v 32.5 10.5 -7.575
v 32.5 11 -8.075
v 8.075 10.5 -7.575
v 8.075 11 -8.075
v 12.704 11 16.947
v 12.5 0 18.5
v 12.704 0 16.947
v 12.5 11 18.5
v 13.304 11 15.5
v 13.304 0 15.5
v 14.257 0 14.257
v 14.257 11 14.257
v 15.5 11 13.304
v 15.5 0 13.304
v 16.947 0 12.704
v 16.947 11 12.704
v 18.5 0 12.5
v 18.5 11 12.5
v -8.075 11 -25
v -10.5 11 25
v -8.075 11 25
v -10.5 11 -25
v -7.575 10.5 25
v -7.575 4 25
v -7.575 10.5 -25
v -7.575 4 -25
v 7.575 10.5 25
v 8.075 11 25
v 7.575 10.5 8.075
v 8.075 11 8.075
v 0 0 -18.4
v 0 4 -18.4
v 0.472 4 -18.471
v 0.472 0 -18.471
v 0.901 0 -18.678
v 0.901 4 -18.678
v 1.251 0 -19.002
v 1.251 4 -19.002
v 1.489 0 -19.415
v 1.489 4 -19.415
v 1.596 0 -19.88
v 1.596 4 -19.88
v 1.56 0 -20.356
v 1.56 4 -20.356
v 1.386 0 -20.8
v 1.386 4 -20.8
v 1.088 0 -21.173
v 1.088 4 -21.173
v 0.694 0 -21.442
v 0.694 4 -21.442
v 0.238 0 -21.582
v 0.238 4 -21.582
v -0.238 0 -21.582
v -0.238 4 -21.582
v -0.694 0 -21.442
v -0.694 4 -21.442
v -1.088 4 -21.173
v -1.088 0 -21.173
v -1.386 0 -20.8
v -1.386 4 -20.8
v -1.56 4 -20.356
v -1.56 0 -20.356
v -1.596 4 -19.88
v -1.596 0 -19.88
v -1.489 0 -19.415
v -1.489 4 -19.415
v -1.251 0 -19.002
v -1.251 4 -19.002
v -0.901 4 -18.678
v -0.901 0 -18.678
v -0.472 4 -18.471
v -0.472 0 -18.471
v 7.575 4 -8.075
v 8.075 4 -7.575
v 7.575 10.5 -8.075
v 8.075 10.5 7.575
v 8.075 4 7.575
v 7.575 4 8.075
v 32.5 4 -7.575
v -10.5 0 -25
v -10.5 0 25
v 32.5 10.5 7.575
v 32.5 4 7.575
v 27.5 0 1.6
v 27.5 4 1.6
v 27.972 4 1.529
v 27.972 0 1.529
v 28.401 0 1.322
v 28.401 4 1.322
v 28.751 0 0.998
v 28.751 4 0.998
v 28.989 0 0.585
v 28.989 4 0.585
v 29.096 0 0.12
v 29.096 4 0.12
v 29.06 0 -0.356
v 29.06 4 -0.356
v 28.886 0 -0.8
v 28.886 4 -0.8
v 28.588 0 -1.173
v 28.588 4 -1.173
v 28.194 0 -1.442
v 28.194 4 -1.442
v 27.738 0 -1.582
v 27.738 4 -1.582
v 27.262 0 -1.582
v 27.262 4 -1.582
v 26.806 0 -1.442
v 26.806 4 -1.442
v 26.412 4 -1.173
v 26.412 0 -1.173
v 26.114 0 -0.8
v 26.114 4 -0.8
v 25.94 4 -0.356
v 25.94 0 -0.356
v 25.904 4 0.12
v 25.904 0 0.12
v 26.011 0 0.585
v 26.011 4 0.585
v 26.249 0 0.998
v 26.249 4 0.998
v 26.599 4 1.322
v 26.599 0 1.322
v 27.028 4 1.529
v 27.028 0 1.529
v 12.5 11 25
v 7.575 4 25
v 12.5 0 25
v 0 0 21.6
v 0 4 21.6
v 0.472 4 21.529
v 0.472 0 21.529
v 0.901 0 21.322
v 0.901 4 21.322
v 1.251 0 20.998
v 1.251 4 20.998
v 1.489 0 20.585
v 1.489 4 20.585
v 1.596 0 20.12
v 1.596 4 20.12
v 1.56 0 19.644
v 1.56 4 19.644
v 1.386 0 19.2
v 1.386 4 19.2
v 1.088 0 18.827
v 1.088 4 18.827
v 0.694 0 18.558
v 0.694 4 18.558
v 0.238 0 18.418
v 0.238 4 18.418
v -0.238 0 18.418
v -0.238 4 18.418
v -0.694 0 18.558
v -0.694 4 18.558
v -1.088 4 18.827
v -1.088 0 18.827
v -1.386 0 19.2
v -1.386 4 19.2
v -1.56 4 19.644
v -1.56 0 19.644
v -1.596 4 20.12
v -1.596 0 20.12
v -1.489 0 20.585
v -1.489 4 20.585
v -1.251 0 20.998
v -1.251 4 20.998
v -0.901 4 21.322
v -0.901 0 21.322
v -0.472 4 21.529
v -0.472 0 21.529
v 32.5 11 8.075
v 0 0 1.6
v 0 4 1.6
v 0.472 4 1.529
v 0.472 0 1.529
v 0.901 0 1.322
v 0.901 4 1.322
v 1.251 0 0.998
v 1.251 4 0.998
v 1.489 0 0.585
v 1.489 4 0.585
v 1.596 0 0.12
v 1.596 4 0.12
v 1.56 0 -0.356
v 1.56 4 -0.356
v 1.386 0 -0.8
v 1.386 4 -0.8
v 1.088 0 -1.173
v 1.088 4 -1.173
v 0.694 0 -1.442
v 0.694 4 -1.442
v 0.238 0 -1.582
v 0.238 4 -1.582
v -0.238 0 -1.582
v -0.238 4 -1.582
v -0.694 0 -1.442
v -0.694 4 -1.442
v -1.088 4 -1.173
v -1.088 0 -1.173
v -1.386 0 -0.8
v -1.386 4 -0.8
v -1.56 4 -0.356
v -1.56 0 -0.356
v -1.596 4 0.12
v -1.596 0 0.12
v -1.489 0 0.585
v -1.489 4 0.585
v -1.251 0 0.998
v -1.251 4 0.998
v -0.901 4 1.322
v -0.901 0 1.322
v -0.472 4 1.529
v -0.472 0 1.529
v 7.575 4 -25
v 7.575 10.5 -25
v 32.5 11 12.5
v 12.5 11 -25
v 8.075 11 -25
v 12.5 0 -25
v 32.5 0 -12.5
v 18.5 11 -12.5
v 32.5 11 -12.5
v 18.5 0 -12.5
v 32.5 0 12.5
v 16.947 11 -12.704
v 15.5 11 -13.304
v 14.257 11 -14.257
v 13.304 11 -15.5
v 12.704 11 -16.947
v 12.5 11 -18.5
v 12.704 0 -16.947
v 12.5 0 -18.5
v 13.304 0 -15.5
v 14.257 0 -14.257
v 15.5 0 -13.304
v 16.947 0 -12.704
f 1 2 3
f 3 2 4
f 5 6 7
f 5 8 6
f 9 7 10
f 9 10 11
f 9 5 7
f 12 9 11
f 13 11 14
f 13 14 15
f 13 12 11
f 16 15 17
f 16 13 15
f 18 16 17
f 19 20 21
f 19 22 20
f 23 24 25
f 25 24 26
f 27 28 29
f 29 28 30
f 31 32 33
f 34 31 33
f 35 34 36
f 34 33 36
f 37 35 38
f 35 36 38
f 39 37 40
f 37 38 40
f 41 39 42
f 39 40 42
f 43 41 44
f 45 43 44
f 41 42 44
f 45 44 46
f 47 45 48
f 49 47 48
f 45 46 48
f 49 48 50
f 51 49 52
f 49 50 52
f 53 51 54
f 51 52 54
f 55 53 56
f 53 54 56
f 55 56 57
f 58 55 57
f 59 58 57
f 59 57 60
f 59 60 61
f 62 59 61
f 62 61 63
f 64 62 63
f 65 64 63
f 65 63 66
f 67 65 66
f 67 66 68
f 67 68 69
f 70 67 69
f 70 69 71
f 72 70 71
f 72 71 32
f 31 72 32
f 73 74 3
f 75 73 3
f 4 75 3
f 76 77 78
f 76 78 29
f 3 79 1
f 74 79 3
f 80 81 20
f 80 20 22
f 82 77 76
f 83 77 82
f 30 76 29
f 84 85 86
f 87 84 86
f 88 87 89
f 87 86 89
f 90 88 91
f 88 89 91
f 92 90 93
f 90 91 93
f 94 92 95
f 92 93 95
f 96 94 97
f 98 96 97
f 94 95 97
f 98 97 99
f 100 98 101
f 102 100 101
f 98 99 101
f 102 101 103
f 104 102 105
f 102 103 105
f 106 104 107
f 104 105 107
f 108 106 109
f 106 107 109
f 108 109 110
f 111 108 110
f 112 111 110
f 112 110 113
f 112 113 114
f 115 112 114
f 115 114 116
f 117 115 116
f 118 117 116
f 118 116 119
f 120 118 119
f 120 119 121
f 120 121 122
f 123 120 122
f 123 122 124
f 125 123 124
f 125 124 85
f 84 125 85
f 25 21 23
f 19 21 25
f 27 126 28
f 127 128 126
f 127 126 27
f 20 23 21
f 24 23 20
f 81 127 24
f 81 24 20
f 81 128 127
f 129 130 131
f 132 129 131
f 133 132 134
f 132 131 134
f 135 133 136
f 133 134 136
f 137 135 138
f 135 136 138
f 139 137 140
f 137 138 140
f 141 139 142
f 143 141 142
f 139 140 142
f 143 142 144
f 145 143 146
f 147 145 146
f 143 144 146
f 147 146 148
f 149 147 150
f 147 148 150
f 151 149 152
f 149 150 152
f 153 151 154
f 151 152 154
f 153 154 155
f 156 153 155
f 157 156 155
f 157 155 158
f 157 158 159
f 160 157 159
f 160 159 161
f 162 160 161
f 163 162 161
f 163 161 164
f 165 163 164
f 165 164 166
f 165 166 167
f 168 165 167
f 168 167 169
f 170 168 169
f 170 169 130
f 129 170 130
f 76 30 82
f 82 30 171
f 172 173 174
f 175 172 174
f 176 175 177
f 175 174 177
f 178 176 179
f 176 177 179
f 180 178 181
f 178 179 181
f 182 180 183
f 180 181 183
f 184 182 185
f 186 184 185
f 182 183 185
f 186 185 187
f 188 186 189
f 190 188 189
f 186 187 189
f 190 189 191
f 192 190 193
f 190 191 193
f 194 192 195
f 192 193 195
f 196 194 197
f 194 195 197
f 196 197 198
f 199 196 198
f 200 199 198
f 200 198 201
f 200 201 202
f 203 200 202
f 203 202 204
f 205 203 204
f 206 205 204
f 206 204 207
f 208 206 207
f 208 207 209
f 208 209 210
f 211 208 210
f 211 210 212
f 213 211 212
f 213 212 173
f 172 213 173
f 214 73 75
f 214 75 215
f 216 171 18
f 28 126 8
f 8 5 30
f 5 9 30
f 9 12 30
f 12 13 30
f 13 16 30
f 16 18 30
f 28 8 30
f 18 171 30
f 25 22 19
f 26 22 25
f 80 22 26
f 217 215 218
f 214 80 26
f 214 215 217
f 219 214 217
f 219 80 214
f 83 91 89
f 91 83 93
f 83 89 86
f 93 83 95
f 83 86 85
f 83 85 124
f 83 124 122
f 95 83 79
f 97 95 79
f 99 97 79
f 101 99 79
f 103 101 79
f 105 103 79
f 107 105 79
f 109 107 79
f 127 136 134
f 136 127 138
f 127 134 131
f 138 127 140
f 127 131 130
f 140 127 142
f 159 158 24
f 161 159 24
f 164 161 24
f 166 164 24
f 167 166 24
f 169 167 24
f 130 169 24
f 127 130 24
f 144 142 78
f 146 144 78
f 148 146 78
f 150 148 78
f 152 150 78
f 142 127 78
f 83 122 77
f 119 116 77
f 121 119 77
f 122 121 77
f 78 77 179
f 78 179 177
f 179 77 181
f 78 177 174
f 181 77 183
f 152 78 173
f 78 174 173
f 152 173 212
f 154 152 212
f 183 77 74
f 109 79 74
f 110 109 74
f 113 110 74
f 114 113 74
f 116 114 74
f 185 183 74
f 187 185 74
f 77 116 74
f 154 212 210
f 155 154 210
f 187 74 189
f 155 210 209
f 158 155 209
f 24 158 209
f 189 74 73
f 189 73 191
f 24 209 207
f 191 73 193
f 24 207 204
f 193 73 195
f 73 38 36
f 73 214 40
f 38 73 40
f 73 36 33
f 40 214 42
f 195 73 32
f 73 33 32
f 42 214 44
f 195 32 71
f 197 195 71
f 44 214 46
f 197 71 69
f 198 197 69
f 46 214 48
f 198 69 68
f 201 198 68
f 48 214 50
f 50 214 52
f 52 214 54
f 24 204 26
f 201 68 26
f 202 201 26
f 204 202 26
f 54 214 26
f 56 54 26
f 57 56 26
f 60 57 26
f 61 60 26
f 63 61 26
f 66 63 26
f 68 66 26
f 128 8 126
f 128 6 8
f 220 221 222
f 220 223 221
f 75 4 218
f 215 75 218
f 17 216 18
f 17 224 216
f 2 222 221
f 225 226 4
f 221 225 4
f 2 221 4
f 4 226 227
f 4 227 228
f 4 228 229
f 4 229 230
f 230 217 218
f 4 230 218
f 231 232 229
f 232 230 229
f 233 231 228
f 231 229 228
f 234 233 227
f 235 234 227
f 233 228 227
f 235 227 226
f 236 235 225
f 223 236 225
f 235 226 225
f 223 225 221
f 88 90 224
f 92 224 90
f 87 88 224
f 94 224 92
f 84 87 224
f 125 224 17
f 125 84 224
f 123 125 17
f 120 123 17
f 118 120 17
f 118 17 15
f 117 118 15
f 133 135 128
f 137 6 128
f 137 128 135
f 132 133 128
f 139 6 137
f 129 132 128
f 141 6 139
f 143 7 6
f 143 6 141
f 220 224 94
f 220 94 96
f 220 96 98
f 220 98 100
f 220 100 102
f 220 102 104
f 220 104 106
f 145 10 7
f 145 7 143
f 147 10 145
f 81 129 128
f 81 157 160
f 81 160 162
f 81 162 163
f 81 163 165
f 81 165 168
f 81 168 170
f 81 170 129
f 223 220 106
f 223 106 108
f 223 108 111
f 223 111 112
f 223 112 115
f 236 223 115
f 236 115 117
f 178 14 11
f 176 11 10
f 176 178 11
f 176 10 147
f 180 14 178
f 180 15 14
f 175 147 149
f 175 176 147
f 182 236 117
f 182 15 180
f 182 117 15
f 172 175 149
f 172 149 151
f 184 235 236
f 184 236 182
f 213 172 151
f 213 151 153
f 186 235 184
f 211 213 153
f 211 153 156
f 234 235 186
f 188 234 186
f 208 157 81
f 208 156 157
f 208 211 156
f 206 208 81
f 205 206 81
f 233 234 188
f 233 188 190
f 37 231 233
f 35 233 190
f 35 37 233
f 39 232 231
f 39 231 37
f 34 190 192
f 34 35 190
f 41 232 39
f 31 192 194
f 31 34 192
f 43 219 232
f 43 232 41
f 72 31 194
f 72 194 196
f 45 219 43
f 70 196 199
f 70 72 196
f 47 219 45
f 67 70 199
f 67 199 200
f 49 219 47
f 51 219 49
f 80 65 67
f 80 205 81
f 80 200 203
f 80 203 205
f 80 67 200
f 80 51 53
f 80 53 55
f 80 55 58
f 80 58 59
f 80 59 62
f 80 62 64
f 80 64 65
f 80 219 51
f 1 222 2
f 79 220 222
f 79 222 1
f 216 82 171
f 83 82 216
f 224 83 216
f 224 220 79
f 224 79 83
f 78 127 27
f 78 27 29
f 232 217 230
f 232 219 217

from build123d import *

# Parameters (mm, degrees)
EXTRUDE_1_DEPTH     = 4
SKETCH_2_W          = 2.925
SKETCH_2_H          = 50
EXTRUDE_2_DEPTH     = 7
SKETCH_3_R          = 1.6
CUT_EXTRUDE_1_DEPTH = 42.596273872
CHAMFER_1_SIZE      = 0.5
FILLET_1_R          = 6


with BuildPart() as part:
    # 草图1 → 凸台-拉伸1 (new body)
    with BuildSketch(Plane(origin=(0, 0, 0), x_dir=(1, 0, 0), z_dir=(0, 1, 0))):
        Polygon((-10.5, 25), (12.5, 25), (12.5, 12.5), (32.5, 12.5), (32.5, -12.5), (12.5, -12.5), (12.5, -25), (-10.5, -25), align=None)
    extrude(amount=EXTRUDE_1_DEPTH)

    # 草图2 → 凸台-拉伸2 (add)
    with BuildSketch(Plane(origin=(0, 4, 0), x_dir=(1, 0, 0), z_dir=(0, 1, 0))):
        Polygon((7.575, -25), (7.575, -7.575), (32.5, -7.575), (32.5, -12.5), (12.5, -12.5), (12.5, -25), align=None)
        Polygon((32.5, 7.575), (7.575, 7.575), (7.575, 25), (12.5, 25), (12.5, 12.5), (32.5, 12.5), align=None)
        with Locations((-9.0375, 0)):
            Rectangle(SKETCH_2_W, SKETCH_2_H)
    extrude(amount=EXTRUDE_2_DEPTH)

    # 草图3 → 切除-拉伸1 (cut, through all)
    with BuildSketch(Plane(origin=(0, 4, 0), x_dir=(1, 0, 0), z_dir=(0, 1, 0))):
        with Locations(Location((0, 0, 0), (0, 0, 270))):
            Circle(SKETCH_3_R)
        with Locations(Location((0, 20, 0), (0, 0, 270))):
            Circle(SKETCH_3_R)
        with Locations(Location((0, -20, 0), (0, 0, 270))):
            Circle(SKETCH_3_R)
        with Locations(Location((27.5, 0, 0), (0, 0, 270))):
            Circle(SKETCH_3_R)
    extrude(amount=-CUT_EXTRUDE_1_DEPTH, mode=Mode.SUBTRACT)

    # 倒角1
    chamfer_1_edges = [part.edges().sort_by_distance(p)[0] for p in [
        (7.575, 7.5, 7.575),
        (20.0375, 11, 7.575),
        (7.575, 11, 16.2875),
        (7.575, 7.5, -7.575),
        (7.575, 11, -16.2875),
        (20.0375, 11, -7.575),
        (-7.575, 11, 0),
    ]]
    chamfer(chamfer_1_edges, length=CHAMFER_1_SIZE)

    # 圆角1
    fillet_1_edges = [part.edges().sort_by_distance(p)[0] for p in [
        (12.5, 5.5, 12.5),
        (12.5, 5.5, -12.5),
    ]]
    fillet(fillet_1_edges, radius=FILLET_1_R)


solid = part.part
